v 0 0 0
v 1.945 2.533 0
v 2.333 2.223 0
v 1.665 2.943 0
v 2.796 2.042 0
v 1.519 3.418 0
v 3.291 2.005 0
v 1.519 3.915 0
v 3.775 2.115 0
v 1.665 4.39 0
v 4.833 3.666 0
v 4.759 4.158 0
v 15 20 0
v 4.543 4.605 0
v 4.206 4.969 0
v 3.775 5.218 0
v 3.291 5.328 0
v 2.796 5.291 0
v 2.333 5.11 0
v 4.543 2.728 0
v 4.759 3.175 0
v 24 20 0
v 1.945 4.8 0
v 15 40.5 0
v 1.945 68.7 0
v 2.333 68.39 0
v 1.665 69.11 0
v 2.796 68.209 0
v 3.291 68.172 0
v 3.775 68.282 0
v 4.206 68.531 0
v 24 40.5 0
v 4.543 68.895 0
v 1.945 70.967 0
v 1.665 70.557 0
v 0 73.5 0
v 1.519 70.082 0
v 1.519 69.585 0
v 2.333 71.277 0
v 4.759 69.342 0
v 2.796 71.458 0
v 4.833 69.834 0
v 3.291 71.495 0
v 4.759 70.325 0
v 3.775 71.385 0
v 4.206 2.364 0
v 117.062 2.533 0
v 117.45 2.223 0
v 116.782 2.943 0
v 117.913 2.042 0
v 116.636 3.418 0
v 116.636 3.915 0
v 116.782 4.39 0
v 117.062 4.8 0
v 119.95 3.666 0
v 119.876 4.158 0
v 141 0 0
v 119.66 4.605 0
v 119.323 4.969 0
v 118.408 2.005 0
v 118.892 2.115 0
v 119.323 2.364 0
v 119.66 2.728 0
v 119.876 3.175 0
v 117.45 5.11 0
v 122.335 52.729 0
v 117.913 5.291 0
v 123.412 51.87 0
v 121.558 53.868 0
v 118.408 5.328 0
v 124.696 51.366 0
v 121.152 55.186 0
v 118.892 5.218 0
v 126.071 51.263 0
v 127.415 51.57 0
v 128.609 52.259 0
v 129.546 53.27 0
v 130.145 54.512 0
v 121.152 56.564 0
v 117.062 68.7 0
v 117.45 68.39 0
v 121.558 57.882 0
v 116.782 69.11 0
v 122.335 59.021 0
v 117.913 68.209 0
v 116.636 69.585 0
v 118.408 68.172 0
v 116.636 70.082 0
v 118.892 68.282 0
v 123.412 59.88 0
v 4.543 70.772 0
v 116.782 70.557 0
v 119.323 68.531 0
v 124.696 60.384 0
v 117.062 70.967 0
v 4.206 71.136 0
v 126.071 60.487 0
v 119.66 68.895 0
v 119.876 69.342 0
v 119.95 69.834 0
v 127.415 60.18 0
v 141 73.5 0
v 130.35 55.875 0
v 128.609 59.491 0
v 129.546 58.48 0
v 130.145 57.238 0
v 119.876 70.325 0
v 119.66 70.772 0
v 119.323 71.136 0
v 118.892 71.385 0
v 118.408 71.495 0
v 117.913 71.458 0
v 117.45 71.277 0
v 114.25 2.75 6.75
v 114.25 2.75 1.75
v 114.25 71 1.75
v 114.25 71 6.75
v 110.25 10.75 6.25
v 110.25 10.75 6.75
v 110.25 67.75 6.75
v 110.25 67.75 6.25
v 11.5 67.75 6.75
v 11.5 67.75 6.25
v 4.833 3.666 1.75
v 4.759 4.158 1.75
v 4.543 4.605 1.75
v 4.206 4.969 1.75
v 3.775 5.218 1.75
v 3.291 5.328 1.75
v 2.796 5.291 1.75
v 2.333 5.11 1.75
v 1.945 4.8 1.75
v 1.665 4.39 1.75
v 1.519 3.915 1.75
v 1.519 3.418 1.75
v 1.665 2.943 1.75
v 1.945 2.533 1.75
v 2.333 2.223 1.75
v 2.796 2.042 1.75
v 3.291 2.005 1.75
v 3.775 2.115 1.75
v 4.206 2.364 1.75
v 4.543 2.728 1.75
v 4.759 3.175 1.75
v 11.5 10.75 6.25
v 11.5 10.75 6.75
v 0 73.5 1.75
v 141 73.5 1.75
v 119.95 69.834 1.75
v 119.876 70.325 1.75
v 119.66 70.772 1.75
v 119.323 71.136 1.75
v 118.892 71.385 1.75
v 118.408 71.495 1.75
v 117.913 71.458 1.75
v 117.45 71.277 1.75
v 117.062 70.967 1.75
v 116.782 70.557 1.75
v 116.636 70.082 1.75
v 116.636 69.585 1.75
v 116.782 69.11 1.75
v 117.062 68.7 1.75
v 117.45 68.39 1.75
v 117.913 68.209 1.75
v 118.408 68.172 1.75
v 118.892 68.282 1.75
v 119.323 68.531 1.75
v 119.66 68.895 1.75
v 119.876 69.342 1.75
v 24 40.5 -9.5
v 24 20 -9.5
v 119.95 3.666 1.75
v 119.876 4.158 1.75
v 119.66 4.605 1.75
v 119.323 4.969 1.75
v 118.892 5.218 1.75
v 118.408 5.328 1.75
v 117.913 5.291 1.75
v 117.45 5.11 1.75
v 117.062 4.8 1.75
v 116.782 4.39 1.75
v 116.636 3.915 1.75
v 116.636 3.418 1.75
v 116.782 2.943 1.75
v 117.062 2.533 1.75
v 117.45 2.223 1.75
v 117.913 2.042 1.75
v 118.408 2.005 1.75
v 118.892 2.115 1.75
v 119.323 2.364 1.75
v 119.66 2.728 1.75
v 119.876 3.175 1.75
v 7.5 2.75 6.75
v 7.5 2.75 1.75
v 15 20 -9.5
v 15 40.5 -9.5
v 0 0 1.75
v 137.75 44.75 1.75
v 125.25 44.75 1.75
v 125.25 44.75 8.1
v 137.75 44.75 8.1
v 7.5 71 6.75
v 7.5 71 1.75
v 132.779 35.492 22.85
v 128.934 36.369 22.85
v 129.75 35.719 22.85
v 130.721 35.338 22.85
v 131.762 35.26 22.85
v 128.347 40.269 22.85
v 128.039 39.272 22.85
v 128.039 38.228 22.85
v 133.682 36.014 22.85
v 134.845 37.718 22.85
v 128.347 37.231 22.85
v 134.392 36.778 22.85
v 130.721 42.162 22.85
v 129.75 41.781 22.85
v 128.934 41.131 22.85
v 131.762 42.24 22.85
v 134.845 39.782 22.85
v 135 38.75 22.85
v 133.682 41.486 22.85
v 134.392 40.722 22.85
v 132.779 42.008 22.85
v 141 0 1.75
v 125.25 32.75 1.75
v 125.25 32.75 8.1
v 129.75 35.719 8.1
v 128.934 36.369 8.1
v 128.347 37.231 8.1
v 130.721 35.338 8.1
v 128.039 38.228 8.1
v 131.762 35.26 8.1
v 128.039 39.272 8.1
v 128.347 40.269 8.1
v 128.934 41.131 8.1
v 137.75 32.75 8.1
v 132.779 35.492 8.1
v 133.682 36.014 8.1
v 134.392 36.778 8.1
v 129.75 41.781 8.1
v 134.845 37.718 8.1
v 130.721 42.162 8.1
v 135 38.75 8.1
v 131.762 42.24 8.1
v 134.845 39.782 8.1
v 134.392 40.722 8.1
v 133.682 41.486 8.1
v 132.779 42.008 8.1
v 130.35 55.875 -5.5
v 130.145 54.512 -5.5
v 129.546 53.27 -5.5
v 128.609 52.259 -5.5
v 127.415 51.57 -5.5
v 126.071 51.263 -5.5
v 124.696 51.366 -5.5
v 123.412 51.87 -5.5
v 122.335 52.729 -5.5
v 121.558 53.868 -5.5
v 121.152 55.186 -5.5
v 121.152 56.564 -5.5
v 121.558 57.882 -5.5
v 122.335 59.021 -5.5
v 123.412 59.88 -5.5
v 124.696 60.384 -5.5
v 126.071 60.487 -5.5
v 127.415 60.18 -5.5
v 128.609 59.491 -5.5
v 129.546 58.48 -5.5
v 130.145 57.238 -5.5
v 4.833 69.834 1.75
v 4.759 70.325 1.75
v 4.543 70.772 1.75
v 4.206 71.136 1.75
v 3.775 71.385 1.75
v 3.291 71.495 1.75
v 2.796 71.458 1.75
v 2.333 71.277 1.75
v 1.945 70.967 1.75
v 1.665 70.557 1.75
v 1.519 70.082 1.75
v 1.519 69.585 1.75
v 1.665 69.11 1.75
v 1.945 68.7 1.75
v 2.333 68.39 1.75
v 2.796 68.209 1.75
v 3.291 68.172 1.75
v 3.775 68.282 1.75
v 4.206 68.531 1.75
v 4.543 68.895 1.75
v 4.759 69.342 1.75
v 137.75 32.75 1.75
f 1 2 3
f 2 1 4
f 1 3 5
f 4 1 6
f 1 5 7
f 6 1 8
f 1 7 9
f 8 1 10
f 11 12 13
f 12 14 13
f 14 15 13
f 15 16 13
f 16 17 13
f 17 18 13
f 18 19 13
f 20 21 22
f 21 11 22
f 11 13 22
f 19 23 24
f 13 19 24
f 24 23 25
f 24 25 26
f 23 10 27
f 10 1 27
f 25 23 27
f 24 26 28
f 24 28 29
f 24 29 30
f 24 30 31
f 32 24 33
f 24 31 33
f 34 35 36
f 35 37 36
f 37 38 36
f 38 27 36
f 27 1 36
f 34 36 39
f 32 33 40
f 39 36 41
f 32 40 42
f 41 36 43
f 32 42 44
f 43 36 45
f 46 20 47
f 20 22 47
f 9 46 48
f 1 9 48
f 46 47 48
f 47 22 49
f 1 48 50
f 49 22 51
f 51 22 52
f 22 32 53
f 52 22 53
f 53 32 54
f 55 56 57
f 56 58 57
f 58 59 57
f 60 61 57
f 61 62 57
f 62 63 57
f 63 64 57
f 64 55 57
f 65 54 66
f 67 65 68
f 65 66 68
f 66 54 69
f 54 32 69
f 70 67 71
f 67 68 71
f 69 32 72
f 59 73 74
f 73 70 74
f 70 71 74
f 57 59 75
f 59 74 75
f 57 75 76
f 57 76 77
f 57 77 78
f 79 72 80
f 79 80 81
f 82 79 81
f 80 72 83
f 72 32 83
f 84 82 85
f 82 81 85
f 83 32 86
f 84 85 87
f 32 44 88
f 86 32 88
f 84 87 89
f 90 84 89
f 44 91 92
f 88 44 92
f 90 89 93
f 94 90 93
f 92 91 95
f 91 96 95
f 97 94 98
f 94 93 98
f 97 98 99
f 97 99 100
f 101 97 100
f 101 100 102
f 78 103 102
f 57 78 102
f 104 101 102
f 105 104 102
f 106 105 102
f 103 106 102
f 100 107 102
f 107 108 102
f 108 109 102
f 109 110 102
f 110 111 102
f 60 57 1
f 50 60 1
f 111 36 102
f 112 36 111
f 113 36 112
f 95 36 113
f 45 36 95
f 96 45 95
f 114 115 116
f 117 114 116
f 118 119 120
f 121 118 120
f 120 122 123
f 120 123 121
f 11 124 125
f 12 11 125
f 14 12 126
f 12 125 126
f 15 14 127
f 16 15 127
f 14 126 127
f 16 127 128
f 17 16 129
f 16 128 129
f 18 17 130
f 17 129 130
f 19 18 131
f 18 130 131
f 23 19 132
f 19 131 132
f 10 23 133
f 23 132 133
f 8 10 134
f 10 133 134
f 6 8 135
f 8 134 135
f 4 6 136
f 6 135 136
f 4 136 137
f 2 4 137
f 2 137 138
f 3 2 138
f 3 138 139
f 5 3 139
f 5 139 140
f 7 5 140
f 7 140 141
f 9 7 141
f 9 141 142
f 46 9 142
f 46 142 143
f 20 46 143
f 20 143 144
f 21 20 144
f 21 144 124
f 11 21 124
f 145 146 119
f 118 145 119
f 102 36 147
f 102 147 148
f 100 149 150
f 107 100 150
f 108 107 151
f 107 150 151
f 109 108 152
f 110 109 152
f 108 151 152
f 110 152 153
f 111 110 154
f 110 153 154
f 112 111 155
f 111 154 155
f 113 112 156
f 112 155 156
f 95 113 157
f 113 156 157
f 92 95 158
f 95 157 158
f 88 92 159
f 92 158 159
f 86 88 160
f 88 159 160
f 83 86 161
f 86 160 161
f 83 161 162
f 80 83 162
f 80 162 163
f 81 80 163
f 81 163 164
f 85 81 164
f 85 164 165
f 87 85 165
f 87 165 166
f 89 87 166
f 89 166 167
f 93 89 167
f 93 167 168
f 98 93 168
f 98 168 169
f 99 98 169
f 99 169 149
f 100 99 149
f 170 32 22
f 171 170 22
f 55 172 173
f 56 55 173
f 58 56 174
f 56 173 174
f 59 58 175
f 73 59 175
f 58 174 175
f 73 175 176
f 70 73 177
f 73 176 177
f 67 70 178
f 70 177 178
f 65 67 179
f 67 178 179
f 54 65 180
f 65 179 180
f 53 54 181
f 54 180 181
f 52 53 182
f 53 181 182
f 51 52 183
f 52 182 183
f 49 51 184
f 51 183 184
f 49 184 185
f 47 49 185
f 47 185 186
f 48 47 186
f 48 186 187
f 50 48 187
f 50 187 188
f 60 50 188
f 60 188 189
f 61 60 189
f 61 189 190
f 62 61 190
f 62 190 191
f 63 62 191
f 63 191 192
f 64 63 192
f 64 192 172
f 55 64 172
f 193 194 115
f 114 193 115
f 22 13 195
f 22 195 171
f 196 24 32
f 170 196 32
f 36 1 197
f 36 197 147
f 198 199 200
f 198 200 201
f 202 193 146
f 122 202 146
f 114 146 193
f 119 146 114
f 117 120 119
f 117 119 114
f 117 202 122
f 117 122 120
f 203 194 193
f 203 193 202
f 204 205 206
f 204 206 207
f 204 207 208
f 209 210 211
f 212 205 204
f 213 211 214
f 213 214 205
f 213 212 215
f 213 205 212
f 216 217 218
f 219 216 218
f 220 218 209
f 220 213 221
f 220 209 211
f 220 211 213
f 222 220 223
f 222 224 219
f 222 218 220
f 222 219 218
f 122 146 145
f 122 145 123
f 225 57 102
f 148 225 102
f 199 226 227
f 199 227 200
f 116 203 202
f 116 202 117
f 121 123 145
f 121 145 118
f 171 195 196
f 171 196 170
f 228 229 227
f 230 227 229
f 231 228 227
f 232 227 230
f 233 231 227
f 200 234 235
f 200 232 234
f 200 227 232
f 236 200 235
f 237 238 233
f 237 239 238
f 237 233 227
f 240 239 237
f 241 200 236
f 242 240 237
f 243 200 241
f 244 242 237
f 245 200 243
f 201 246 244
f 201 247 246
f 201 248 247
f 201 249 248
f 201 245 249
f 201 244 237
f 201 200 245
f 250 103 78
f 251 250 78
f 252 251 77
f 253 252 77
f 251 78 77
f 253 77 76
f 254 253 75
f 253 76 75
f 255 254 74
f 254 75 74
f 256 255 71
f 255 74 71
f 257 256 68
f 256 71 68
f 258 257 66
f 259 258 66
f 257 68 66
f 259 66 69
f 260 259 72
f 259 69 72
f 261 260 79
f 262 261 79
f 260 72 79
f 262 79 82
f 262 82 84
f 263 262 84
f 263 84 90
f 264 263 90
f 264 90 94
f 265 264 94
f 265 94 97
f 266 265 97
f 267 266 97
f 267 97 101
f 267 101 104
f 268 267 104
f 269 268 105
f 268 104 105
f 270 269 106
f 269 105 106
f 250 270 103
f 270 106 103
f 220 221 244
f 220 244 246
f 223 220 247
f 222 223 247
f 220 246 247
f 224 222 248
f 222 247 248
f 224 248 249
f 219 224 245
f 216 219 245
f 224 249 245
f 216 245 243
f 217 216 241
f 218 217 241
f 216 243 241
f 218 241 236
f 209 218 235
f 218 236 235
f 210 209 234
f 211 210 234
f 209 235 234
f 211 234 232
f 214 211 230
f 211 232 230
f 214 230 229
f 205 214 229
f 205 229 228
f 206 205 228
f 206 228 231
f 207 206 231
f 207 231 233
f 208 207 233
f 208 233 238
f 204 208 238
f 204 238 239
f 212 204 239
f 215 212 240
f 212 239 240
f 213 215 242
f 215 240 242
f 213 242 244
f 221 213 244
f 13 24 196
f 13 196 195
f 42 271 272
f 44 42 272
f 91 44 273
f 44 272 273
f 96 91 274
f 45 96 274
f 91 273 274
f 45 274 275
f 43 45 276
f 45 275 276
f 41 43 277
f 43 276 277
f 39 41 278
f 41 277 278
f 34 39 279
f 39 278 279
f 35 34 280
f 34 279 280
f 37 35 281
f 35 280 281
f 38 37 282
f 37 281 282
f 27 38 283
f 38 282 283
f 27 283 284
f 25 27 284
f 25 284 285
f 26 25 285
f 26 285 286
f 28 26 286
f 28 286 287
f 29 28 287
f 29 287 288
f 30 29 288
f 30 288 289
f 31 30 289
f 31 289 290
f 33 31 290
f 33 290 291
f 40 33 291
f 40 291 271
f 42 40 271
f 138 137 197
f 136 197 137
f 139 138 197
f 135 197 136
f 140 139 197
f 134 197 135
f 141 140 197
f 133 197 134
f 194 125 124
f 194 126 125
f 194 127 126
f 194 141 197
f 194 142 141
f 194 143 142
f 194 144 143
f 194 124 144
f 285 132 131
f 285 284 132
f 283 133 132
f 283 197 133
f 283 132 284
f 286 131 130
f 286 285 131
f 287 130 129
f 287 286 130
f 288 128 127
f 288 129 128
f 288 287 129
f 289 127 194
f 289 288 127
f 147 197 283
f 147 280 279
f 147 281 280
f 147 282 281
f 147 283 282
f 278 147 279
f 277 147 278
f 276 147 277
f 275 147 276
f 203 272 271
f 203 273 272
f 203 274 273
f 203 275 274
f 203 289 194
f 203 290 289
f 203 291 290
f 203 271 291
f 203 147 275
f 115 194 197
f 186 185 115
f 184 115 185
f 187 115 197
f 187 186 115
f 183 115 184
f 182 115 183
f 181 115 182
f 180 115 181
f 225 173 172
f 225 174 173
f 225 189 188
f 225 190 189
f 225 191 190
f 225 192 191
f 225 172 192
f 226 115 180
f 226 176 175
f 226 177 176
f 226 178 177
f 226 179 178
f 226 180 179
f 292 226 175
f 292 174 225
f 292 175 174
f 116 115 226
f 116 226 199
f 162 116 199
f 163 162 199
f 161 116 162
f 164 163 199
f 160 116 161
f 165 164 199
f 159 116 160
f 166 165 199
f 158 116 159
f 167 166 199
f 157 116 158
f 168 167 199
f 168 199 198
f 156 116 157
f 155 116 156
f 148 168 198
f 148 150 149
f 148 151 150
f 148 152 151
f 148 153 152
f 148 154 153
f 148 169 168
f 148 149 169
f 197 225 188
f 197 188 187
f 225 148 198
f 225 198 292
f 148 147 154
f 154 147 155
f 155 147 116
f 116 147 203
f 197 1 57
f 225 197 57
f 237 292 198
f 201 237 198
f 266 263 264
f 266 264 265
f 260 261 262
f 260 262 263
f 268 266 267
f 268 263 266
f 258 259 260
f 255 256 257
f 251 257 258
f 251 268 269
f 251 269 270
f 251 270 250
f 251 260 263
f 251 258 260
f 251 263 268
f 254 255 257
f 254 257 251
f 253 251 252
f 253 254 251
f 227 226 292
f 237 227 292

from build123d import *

# Parameters (mm, degrees)
SKETCH_W        = 141
SKETCH_H        = 73.5
PAD_DEPTH       = 1.75
SKETCH001_W     = 106.75
SKETCH001_H     = 68.25
PAD001_DEPTH    = 5
SKETCH002_W     = 98.75
SKETCH002_H     = 57
POCKET_DEPTH    = 0.5
SKETCH003_W     = 12.5
SKETCH003_H     = 12
PAD002_DEPTH    = 6.35
SKETCH004_R     = 3.5
PAD003_DEPTH    = 14.75
SKETCH005_R     = 4.625
PAD004_DEPTH    = 5.5
SKETCH006_W     = 9
SKETCH006_H     = 20.5
PAD005_DEPTH    = 9.5
SKETCH007_R     = 1.6665
POCKET001_DEPTH = 11.251


with BuildPart() as part:
    # Sketch → Pad (new body)
    with BuildSketch(Plane.XY):
        with Locations((70.5, 36.75)):
            Rectangle(SKETCH_W, SKETCH_H)
    extrude(amount=PAD_DEPTH)

    # Sketch001 (on Face6 of Pad) → Pad001 (join)
    with BuildSketch(Plane.XY.offset(1.75)):
        with Locations((60.875, 36.875)):
            Rectangle(SKETCH001_W, SKETCH001_H)
    extrude(amount=PAD001_DEPTH)

    # Sketch002 (on Face11 of Pad001) → Pocket (cut)
    with BuildSketch(Plane.XY.offset(6.75)):
        with Locations((60.875, 39.25)):
            Rectangle(SKETCH002_W, SKETCH002_H)
    extrude(amount=-POCKET_DEPTH, mode=Mode.SUBTRACT)

    # Sketch003 (on Face5 of Pocket) → Pad002 (join)
    with BuildSketch(Plane.XY.offset(1.75)):
        with Locations((131.5, 38.75)):
            Rectangle(SKETCH003_W, SKETCH003_H)
    extrude(amount=PAD002_DEPTH)

    # Sketch004 (on Face16 of Pad002) → Pad003 (join)
    with BuildSketch(Plane.XY.offset(8.1)):
        with Locations((131.5, 38.75)):
            Circle(SKETCH004_R)
    extrude(amount=PAD003_DEPTH)

    # Sketch005 (on Face4 of Pad003) → Pad004 (join)
    with BuildSketch(Plane(origin=(0, 0, 0), x_dir=(1, 0, 0), z_dir=(0, 0, -1))):
        with Locations((125.725, -55.875)):
            Circle(SKETCH005_R)
    extrude(amount=PAD004_DEPTH)

    # Sketch006 (on Face4 of Pad004) → Pad005 (join)
    with BuildSketch(Plane(origin=(0, 0, 0), x_dir=(1, 0, 0), z_dir=(0, 0, -1))):
        with Locations((19.5, -30.25)):
            Rectangle(SKETCH006_W, SKETCH006_H)
    extrude(amount=PAD005_DEPTH)

    # Sketch007 (on Face5 of Pad005) → Pocket001 (cut, through all)
    with BuildSketch(Plane.XY.offset(1.75)):
        with Locations((3.1665, 3.6665)):
            Circle(SKETCH007_R)
        with Locations((3.1665, 69.8335)):
            Circle(SKETCH007_R)
        with Locations((118.2835, 3.6665)):
            Circle(SKETCH007_R)
        with Locations((118.2835, 69.8335)):
            Circle(SKETCH007_R)
    extrude(amount=-POCKET001_DEPTH, mode=Mode.SUBTRACT)


solid = part.part
